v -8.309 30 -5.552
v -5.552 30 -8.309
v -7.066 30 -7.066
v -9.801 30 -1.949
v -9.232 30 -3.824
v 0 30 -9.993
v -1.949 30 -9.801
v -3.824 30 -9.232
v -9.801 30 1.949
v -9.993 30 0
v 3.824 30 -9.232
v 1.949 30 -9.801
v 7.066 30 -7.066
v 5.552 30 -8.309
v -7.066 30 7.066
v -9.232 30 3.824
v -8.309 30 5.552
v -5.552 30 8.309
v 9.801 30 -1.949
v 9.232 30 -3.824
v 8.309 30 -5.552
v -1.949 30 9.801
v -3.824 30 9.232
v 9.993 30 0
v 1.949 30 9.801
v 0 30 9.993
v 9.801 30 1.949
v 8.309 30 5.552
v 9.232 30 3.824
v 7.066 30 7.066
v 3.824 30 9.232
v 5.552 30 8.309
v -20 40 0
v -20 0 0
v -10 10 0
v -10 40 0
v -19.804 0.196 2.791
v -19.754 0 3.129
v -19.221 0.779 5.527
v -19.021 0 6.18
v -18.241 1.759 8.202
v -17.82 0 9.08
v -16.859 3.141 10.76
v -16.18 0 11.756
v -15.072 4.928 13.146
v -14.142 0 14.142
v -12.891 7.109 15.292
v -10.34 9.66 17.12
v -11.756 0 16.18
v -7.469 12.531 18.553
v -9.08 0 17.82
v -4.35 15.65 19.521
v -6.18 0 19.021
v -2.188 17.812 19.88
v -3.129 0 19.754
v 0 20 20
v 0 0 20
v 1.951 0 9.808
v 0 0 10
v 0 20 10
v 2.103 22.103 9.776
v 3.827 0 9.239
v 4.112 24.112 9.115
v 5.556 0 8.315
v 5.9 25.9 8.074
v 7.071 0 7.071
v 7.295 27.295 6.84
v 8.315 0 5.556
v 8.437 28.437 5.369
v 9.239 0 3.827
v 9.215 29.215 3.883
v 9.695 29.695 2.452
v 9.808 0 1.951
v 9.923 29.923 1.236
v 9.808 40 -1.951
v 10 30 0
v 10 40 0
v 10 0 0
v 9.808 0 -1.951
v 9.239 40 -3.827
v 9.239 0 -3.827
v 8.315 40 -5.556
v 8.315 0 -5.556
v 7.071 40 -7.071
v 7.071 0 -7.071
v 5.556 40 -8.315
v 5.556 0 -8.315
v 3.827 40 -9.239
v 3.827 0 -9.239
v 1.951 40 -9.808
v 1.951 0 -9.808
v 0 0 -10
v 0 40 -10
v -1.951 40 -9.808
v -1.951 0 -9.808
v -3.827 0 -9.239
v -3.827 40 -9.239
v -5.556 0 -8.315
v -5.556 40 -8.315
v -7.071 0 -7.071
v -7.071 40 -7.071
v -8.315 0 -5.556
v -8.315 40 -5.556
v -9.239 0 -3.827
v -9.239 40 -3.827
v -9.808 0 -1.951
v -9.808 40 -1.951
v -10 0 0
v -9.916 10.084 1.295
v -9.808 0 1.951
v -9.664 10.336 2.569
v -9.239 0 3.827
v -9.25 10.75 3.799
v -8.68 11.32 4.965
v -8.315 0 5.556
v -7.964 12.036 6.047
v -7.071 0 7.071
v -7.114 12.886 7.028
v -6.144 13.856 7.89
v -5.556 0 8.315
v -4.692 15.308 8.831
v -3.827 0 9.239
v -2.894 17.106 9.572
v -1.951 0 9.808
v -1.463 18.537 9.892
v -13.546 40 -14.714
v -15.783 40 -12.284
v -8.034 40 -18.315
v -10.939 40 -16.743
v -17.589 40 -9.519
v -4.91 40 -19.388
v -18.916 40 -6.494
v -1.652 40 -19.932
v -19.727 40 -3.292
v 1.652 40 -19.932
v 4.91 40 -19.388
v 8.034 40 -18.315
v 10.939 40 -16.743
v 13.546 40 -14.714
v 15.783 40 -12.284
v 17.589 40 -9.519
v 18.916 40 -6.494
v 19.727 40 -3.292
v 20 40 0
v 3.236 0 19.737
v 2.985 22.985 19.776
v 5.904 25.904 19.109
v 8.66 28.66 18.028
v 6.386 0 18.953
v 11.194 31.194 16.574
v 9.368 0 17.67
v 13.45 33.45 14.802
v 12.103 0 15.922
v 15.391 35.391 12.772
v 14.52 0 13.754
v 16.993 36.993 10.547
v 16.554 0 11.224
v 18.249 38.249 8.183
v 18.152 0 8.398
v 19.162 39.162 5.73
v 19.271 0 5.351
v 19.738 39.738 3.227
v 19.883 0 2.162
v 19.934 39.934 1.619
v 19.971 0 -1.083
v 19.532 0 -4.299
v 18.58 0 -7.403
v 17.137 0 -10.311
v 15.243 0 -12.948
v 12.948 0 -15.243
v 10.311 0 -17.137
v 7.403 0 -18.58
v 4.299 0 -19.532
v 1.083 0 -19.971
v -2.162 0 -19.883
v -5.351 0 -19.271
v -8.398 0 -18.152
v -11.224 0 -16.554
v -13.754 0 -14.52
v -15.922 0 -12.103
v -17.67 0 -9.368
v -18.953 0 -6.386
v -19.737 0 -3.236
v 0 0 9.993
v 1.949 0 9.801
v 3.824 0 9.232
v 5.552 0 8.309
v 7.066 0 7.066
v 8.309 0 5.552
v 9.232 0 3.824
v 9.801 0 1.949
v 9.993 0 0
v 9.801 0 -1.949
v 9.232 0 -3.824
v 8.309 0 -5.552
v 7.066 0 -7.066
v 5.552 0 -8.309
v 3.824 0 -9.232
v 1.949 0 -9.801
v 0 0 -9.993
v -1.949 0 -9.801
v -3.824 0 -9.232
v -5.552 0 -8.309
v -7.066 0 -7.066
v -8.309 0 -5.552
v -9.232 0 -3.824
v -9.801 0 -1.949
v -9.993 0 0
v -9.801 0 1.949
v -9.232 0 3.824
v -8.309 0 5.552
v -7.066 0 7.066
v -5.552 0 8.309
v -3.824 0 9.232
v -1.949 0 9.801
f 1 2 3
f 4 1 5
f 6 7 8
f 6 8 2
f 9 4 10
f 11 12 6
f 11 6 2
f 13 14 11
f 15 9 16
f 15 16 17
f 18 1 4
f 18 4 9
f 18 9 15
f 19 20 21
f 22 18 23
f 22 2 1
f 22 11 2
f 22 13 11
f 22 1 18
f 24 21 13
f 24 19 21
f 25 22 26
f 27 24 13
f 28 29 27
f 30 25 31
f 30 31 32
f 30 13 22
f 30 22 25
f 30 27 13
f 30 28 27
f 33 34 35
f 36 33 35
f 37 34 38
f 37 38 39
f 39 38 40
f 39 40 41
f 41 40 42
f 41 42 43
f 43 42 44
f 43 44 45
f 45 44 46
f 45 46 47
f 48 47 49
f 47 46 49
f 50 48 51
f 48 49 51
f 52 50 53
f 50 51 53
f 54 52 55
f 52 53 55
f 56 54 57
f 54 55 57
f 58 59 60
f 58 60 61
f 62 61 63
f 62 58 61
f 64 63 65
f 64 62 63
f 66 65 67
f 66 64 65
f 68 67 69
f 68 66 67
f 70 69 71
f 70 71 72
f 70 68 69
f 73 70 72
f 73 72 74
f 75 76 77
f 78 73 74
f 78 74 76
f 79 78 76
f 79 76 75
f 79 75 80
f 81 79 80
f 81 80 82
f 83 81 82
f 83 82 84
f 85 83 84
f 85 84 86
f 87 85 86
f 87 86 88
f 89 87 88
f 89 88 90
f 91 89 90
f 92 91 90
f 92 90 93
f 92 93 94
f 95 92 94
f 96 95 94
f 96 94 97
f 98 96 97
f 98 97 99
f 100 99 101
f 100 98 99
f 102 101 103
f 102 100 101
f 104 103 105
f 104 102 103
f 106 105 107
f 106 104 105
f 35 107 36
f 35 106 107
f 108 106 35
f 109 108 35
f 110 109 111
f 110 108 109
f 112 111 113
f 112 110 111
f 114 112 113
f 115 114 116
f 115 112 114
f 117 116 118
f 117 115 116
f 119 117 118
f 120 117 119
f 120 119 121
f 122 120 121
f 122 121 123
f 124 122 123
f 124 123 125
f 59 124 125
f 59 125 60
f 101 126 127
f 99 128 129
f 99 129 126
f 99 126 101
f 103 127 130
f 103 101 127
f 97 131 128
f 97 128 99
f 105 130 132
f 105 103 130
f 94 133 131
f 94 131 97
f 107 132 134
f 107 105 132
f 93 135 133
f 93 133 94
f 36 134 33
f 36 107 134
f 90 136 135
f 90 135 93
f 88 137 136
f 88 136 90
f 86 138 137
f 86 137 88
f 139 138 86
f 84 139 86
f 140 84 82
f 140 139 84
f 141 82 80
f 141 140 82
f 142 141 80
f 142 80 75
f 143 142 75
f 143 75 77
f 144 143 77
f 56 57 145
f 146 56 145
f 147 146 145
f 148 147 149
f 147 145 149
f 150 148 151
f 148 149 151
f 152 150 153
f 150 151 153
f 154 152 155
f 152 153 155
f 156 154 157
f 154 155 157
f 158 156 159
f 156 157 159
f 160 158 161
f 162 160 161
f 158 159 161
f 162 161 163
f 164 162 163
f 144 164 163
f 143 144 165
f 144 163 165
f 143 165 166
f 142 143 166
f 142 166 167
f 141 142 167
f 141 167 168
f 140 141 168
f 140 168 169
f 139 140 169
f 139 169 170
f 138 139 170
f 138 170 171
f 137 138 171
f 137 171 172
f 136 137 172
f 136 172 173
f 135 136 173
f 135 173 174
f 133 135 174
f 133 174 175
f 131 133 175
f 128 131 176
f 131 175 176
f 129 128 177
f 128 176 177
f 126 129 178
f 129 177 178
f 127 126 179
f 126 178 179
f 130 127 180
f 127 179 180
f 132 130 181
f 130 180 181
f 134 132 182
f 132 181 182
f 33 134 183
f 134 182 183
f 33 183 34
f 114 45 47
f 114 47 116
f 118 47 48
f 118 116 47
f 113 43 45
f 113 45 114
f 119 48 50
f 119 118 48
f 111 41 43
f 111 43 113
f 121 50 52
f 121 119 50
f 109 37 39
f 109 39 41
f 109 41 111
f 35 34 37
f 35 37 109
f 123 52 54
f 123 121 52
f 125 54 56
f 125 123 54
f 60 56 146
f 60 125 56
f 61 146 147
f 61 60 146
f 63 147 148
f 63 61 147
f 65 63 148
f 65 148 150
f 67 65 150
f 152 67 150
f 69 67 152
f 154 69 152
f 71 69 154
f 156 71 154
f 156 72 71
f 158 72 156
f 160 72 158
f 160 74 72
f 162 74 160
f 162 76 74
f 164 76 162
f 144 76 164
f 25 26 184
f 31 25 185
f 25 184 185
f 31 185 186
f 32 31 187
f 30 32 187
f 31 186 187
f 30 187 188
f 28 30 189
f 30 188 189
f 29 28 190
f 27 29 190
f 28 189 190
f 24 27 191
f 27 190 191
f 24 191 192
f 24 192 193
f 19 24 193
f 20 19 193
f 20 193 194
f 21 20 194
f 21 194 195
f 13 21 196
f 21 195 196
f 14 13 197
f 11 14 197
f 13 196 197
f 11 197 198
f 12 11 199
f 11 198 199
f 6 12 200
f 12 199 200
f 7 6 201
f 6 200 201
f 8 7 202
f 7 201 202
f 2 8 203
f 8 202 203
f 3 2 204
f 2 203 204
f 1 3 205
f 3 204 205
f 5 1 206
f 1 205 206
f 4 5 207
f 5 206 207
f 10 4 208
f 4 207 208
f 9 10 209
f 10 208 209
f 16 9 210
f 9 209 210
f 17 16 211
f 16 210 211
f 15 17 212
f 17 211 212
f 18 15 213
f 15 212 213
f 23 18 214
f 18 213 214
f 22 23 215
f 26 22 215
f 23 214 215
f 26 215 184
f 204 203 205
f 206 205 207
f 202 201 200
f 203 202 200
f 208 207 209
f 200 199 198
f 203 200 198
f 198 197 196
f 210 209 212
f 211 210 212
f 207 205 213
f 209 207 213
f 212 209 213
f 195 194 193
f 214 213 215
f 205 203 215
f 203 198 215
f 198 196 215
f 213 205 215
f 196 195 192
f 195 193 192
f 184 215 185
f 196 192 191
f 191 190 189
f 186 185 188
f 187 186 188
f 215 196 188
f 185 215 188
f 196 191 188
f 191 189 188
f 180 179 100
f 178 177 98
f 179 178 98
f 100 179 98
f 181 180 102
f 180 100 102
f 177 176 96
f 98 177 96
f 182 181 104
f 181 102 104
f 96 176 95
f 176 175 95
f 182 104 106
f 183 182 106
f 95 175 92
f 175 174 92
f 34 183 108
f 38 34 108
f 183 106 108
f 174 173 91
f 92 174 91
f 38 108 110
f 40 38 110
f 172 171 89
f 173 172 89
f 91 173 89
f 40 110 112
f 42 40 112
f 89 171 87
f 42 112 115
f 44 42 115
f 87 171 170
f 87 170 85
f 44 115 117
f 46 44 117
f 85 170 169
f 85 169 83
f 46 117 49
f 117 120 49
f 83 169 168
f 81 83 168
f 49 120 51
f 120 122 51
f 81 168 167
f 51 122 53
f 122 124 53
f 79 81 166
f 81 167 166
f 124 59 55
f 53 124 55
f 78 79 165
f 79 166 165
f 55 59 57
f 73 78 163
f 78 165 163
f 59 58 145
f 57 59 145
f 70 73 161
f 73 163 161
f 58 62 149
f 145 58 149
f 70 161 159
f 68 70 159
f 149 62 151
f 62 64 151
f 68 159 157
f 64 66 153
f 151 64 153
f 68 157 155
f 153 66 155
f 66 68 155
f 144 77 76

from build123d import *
from build123d.topology import SkipClean

# Parameters (mm, degrees)
SKETCH1_R           = 20
SKETCH1_R_2         = 10
BOSS_EXTRUDE3_DEPTH = 40
CUT_EXTRUDE2_DEPTH  = 40
SKETCH5_R           = 9.992609398
BOSS_EXTRUDE4_DEPTH = 30


with BuildPart() as part:
    # Sketch1 → Boss-Extrude3 (new body)
    with BuildSketch(Plane(origin=(0, 0, 0), x_dir=(1, 0, 0), z_dir=(0, 1, 0))):
        with Locations(Location((0, 0, 0), (0, 0, 270))):
            Circle(SKETCH1_R)
        with Locations(Location((0, 0, 0), (0, 0, 270))):
            Circle(SKETCH1_R_2, mode=Mode.SUBTRACT)
    extrude(amount=BOSS_EXTRUDE3_DEPTH)

    # Sketch4 → Cut-Extrude2 (cut)
    with SkipClean():  # the faces are left unmerged after this step: merging them gives an invalid solid
        with BuildSketch(Plane.XY):
            Polygon((-20, 0), (20, 40), (-20, 40), align=None)
        extrude(amount=CUT_EXTRUDE2_DEPTH, mode=Mode.SUBTRACT)


with BuildPart() as body_2:
    # Sketch5 → Boss-Extrude4 (new body)
    with BuildSketch(Plane(origin=(0, 0, 0), x_dir=(1, 0, 0), z_dir=(0, 1, 0))):
        with Locations(Location((0, 0, 0), (0, 0, 270))):
            Circle(SKETCH5_R)
    extrude(amount=BOSS_EXTRUDE4_DEPTH)


solid = Compound([part.part, body_2.part])
